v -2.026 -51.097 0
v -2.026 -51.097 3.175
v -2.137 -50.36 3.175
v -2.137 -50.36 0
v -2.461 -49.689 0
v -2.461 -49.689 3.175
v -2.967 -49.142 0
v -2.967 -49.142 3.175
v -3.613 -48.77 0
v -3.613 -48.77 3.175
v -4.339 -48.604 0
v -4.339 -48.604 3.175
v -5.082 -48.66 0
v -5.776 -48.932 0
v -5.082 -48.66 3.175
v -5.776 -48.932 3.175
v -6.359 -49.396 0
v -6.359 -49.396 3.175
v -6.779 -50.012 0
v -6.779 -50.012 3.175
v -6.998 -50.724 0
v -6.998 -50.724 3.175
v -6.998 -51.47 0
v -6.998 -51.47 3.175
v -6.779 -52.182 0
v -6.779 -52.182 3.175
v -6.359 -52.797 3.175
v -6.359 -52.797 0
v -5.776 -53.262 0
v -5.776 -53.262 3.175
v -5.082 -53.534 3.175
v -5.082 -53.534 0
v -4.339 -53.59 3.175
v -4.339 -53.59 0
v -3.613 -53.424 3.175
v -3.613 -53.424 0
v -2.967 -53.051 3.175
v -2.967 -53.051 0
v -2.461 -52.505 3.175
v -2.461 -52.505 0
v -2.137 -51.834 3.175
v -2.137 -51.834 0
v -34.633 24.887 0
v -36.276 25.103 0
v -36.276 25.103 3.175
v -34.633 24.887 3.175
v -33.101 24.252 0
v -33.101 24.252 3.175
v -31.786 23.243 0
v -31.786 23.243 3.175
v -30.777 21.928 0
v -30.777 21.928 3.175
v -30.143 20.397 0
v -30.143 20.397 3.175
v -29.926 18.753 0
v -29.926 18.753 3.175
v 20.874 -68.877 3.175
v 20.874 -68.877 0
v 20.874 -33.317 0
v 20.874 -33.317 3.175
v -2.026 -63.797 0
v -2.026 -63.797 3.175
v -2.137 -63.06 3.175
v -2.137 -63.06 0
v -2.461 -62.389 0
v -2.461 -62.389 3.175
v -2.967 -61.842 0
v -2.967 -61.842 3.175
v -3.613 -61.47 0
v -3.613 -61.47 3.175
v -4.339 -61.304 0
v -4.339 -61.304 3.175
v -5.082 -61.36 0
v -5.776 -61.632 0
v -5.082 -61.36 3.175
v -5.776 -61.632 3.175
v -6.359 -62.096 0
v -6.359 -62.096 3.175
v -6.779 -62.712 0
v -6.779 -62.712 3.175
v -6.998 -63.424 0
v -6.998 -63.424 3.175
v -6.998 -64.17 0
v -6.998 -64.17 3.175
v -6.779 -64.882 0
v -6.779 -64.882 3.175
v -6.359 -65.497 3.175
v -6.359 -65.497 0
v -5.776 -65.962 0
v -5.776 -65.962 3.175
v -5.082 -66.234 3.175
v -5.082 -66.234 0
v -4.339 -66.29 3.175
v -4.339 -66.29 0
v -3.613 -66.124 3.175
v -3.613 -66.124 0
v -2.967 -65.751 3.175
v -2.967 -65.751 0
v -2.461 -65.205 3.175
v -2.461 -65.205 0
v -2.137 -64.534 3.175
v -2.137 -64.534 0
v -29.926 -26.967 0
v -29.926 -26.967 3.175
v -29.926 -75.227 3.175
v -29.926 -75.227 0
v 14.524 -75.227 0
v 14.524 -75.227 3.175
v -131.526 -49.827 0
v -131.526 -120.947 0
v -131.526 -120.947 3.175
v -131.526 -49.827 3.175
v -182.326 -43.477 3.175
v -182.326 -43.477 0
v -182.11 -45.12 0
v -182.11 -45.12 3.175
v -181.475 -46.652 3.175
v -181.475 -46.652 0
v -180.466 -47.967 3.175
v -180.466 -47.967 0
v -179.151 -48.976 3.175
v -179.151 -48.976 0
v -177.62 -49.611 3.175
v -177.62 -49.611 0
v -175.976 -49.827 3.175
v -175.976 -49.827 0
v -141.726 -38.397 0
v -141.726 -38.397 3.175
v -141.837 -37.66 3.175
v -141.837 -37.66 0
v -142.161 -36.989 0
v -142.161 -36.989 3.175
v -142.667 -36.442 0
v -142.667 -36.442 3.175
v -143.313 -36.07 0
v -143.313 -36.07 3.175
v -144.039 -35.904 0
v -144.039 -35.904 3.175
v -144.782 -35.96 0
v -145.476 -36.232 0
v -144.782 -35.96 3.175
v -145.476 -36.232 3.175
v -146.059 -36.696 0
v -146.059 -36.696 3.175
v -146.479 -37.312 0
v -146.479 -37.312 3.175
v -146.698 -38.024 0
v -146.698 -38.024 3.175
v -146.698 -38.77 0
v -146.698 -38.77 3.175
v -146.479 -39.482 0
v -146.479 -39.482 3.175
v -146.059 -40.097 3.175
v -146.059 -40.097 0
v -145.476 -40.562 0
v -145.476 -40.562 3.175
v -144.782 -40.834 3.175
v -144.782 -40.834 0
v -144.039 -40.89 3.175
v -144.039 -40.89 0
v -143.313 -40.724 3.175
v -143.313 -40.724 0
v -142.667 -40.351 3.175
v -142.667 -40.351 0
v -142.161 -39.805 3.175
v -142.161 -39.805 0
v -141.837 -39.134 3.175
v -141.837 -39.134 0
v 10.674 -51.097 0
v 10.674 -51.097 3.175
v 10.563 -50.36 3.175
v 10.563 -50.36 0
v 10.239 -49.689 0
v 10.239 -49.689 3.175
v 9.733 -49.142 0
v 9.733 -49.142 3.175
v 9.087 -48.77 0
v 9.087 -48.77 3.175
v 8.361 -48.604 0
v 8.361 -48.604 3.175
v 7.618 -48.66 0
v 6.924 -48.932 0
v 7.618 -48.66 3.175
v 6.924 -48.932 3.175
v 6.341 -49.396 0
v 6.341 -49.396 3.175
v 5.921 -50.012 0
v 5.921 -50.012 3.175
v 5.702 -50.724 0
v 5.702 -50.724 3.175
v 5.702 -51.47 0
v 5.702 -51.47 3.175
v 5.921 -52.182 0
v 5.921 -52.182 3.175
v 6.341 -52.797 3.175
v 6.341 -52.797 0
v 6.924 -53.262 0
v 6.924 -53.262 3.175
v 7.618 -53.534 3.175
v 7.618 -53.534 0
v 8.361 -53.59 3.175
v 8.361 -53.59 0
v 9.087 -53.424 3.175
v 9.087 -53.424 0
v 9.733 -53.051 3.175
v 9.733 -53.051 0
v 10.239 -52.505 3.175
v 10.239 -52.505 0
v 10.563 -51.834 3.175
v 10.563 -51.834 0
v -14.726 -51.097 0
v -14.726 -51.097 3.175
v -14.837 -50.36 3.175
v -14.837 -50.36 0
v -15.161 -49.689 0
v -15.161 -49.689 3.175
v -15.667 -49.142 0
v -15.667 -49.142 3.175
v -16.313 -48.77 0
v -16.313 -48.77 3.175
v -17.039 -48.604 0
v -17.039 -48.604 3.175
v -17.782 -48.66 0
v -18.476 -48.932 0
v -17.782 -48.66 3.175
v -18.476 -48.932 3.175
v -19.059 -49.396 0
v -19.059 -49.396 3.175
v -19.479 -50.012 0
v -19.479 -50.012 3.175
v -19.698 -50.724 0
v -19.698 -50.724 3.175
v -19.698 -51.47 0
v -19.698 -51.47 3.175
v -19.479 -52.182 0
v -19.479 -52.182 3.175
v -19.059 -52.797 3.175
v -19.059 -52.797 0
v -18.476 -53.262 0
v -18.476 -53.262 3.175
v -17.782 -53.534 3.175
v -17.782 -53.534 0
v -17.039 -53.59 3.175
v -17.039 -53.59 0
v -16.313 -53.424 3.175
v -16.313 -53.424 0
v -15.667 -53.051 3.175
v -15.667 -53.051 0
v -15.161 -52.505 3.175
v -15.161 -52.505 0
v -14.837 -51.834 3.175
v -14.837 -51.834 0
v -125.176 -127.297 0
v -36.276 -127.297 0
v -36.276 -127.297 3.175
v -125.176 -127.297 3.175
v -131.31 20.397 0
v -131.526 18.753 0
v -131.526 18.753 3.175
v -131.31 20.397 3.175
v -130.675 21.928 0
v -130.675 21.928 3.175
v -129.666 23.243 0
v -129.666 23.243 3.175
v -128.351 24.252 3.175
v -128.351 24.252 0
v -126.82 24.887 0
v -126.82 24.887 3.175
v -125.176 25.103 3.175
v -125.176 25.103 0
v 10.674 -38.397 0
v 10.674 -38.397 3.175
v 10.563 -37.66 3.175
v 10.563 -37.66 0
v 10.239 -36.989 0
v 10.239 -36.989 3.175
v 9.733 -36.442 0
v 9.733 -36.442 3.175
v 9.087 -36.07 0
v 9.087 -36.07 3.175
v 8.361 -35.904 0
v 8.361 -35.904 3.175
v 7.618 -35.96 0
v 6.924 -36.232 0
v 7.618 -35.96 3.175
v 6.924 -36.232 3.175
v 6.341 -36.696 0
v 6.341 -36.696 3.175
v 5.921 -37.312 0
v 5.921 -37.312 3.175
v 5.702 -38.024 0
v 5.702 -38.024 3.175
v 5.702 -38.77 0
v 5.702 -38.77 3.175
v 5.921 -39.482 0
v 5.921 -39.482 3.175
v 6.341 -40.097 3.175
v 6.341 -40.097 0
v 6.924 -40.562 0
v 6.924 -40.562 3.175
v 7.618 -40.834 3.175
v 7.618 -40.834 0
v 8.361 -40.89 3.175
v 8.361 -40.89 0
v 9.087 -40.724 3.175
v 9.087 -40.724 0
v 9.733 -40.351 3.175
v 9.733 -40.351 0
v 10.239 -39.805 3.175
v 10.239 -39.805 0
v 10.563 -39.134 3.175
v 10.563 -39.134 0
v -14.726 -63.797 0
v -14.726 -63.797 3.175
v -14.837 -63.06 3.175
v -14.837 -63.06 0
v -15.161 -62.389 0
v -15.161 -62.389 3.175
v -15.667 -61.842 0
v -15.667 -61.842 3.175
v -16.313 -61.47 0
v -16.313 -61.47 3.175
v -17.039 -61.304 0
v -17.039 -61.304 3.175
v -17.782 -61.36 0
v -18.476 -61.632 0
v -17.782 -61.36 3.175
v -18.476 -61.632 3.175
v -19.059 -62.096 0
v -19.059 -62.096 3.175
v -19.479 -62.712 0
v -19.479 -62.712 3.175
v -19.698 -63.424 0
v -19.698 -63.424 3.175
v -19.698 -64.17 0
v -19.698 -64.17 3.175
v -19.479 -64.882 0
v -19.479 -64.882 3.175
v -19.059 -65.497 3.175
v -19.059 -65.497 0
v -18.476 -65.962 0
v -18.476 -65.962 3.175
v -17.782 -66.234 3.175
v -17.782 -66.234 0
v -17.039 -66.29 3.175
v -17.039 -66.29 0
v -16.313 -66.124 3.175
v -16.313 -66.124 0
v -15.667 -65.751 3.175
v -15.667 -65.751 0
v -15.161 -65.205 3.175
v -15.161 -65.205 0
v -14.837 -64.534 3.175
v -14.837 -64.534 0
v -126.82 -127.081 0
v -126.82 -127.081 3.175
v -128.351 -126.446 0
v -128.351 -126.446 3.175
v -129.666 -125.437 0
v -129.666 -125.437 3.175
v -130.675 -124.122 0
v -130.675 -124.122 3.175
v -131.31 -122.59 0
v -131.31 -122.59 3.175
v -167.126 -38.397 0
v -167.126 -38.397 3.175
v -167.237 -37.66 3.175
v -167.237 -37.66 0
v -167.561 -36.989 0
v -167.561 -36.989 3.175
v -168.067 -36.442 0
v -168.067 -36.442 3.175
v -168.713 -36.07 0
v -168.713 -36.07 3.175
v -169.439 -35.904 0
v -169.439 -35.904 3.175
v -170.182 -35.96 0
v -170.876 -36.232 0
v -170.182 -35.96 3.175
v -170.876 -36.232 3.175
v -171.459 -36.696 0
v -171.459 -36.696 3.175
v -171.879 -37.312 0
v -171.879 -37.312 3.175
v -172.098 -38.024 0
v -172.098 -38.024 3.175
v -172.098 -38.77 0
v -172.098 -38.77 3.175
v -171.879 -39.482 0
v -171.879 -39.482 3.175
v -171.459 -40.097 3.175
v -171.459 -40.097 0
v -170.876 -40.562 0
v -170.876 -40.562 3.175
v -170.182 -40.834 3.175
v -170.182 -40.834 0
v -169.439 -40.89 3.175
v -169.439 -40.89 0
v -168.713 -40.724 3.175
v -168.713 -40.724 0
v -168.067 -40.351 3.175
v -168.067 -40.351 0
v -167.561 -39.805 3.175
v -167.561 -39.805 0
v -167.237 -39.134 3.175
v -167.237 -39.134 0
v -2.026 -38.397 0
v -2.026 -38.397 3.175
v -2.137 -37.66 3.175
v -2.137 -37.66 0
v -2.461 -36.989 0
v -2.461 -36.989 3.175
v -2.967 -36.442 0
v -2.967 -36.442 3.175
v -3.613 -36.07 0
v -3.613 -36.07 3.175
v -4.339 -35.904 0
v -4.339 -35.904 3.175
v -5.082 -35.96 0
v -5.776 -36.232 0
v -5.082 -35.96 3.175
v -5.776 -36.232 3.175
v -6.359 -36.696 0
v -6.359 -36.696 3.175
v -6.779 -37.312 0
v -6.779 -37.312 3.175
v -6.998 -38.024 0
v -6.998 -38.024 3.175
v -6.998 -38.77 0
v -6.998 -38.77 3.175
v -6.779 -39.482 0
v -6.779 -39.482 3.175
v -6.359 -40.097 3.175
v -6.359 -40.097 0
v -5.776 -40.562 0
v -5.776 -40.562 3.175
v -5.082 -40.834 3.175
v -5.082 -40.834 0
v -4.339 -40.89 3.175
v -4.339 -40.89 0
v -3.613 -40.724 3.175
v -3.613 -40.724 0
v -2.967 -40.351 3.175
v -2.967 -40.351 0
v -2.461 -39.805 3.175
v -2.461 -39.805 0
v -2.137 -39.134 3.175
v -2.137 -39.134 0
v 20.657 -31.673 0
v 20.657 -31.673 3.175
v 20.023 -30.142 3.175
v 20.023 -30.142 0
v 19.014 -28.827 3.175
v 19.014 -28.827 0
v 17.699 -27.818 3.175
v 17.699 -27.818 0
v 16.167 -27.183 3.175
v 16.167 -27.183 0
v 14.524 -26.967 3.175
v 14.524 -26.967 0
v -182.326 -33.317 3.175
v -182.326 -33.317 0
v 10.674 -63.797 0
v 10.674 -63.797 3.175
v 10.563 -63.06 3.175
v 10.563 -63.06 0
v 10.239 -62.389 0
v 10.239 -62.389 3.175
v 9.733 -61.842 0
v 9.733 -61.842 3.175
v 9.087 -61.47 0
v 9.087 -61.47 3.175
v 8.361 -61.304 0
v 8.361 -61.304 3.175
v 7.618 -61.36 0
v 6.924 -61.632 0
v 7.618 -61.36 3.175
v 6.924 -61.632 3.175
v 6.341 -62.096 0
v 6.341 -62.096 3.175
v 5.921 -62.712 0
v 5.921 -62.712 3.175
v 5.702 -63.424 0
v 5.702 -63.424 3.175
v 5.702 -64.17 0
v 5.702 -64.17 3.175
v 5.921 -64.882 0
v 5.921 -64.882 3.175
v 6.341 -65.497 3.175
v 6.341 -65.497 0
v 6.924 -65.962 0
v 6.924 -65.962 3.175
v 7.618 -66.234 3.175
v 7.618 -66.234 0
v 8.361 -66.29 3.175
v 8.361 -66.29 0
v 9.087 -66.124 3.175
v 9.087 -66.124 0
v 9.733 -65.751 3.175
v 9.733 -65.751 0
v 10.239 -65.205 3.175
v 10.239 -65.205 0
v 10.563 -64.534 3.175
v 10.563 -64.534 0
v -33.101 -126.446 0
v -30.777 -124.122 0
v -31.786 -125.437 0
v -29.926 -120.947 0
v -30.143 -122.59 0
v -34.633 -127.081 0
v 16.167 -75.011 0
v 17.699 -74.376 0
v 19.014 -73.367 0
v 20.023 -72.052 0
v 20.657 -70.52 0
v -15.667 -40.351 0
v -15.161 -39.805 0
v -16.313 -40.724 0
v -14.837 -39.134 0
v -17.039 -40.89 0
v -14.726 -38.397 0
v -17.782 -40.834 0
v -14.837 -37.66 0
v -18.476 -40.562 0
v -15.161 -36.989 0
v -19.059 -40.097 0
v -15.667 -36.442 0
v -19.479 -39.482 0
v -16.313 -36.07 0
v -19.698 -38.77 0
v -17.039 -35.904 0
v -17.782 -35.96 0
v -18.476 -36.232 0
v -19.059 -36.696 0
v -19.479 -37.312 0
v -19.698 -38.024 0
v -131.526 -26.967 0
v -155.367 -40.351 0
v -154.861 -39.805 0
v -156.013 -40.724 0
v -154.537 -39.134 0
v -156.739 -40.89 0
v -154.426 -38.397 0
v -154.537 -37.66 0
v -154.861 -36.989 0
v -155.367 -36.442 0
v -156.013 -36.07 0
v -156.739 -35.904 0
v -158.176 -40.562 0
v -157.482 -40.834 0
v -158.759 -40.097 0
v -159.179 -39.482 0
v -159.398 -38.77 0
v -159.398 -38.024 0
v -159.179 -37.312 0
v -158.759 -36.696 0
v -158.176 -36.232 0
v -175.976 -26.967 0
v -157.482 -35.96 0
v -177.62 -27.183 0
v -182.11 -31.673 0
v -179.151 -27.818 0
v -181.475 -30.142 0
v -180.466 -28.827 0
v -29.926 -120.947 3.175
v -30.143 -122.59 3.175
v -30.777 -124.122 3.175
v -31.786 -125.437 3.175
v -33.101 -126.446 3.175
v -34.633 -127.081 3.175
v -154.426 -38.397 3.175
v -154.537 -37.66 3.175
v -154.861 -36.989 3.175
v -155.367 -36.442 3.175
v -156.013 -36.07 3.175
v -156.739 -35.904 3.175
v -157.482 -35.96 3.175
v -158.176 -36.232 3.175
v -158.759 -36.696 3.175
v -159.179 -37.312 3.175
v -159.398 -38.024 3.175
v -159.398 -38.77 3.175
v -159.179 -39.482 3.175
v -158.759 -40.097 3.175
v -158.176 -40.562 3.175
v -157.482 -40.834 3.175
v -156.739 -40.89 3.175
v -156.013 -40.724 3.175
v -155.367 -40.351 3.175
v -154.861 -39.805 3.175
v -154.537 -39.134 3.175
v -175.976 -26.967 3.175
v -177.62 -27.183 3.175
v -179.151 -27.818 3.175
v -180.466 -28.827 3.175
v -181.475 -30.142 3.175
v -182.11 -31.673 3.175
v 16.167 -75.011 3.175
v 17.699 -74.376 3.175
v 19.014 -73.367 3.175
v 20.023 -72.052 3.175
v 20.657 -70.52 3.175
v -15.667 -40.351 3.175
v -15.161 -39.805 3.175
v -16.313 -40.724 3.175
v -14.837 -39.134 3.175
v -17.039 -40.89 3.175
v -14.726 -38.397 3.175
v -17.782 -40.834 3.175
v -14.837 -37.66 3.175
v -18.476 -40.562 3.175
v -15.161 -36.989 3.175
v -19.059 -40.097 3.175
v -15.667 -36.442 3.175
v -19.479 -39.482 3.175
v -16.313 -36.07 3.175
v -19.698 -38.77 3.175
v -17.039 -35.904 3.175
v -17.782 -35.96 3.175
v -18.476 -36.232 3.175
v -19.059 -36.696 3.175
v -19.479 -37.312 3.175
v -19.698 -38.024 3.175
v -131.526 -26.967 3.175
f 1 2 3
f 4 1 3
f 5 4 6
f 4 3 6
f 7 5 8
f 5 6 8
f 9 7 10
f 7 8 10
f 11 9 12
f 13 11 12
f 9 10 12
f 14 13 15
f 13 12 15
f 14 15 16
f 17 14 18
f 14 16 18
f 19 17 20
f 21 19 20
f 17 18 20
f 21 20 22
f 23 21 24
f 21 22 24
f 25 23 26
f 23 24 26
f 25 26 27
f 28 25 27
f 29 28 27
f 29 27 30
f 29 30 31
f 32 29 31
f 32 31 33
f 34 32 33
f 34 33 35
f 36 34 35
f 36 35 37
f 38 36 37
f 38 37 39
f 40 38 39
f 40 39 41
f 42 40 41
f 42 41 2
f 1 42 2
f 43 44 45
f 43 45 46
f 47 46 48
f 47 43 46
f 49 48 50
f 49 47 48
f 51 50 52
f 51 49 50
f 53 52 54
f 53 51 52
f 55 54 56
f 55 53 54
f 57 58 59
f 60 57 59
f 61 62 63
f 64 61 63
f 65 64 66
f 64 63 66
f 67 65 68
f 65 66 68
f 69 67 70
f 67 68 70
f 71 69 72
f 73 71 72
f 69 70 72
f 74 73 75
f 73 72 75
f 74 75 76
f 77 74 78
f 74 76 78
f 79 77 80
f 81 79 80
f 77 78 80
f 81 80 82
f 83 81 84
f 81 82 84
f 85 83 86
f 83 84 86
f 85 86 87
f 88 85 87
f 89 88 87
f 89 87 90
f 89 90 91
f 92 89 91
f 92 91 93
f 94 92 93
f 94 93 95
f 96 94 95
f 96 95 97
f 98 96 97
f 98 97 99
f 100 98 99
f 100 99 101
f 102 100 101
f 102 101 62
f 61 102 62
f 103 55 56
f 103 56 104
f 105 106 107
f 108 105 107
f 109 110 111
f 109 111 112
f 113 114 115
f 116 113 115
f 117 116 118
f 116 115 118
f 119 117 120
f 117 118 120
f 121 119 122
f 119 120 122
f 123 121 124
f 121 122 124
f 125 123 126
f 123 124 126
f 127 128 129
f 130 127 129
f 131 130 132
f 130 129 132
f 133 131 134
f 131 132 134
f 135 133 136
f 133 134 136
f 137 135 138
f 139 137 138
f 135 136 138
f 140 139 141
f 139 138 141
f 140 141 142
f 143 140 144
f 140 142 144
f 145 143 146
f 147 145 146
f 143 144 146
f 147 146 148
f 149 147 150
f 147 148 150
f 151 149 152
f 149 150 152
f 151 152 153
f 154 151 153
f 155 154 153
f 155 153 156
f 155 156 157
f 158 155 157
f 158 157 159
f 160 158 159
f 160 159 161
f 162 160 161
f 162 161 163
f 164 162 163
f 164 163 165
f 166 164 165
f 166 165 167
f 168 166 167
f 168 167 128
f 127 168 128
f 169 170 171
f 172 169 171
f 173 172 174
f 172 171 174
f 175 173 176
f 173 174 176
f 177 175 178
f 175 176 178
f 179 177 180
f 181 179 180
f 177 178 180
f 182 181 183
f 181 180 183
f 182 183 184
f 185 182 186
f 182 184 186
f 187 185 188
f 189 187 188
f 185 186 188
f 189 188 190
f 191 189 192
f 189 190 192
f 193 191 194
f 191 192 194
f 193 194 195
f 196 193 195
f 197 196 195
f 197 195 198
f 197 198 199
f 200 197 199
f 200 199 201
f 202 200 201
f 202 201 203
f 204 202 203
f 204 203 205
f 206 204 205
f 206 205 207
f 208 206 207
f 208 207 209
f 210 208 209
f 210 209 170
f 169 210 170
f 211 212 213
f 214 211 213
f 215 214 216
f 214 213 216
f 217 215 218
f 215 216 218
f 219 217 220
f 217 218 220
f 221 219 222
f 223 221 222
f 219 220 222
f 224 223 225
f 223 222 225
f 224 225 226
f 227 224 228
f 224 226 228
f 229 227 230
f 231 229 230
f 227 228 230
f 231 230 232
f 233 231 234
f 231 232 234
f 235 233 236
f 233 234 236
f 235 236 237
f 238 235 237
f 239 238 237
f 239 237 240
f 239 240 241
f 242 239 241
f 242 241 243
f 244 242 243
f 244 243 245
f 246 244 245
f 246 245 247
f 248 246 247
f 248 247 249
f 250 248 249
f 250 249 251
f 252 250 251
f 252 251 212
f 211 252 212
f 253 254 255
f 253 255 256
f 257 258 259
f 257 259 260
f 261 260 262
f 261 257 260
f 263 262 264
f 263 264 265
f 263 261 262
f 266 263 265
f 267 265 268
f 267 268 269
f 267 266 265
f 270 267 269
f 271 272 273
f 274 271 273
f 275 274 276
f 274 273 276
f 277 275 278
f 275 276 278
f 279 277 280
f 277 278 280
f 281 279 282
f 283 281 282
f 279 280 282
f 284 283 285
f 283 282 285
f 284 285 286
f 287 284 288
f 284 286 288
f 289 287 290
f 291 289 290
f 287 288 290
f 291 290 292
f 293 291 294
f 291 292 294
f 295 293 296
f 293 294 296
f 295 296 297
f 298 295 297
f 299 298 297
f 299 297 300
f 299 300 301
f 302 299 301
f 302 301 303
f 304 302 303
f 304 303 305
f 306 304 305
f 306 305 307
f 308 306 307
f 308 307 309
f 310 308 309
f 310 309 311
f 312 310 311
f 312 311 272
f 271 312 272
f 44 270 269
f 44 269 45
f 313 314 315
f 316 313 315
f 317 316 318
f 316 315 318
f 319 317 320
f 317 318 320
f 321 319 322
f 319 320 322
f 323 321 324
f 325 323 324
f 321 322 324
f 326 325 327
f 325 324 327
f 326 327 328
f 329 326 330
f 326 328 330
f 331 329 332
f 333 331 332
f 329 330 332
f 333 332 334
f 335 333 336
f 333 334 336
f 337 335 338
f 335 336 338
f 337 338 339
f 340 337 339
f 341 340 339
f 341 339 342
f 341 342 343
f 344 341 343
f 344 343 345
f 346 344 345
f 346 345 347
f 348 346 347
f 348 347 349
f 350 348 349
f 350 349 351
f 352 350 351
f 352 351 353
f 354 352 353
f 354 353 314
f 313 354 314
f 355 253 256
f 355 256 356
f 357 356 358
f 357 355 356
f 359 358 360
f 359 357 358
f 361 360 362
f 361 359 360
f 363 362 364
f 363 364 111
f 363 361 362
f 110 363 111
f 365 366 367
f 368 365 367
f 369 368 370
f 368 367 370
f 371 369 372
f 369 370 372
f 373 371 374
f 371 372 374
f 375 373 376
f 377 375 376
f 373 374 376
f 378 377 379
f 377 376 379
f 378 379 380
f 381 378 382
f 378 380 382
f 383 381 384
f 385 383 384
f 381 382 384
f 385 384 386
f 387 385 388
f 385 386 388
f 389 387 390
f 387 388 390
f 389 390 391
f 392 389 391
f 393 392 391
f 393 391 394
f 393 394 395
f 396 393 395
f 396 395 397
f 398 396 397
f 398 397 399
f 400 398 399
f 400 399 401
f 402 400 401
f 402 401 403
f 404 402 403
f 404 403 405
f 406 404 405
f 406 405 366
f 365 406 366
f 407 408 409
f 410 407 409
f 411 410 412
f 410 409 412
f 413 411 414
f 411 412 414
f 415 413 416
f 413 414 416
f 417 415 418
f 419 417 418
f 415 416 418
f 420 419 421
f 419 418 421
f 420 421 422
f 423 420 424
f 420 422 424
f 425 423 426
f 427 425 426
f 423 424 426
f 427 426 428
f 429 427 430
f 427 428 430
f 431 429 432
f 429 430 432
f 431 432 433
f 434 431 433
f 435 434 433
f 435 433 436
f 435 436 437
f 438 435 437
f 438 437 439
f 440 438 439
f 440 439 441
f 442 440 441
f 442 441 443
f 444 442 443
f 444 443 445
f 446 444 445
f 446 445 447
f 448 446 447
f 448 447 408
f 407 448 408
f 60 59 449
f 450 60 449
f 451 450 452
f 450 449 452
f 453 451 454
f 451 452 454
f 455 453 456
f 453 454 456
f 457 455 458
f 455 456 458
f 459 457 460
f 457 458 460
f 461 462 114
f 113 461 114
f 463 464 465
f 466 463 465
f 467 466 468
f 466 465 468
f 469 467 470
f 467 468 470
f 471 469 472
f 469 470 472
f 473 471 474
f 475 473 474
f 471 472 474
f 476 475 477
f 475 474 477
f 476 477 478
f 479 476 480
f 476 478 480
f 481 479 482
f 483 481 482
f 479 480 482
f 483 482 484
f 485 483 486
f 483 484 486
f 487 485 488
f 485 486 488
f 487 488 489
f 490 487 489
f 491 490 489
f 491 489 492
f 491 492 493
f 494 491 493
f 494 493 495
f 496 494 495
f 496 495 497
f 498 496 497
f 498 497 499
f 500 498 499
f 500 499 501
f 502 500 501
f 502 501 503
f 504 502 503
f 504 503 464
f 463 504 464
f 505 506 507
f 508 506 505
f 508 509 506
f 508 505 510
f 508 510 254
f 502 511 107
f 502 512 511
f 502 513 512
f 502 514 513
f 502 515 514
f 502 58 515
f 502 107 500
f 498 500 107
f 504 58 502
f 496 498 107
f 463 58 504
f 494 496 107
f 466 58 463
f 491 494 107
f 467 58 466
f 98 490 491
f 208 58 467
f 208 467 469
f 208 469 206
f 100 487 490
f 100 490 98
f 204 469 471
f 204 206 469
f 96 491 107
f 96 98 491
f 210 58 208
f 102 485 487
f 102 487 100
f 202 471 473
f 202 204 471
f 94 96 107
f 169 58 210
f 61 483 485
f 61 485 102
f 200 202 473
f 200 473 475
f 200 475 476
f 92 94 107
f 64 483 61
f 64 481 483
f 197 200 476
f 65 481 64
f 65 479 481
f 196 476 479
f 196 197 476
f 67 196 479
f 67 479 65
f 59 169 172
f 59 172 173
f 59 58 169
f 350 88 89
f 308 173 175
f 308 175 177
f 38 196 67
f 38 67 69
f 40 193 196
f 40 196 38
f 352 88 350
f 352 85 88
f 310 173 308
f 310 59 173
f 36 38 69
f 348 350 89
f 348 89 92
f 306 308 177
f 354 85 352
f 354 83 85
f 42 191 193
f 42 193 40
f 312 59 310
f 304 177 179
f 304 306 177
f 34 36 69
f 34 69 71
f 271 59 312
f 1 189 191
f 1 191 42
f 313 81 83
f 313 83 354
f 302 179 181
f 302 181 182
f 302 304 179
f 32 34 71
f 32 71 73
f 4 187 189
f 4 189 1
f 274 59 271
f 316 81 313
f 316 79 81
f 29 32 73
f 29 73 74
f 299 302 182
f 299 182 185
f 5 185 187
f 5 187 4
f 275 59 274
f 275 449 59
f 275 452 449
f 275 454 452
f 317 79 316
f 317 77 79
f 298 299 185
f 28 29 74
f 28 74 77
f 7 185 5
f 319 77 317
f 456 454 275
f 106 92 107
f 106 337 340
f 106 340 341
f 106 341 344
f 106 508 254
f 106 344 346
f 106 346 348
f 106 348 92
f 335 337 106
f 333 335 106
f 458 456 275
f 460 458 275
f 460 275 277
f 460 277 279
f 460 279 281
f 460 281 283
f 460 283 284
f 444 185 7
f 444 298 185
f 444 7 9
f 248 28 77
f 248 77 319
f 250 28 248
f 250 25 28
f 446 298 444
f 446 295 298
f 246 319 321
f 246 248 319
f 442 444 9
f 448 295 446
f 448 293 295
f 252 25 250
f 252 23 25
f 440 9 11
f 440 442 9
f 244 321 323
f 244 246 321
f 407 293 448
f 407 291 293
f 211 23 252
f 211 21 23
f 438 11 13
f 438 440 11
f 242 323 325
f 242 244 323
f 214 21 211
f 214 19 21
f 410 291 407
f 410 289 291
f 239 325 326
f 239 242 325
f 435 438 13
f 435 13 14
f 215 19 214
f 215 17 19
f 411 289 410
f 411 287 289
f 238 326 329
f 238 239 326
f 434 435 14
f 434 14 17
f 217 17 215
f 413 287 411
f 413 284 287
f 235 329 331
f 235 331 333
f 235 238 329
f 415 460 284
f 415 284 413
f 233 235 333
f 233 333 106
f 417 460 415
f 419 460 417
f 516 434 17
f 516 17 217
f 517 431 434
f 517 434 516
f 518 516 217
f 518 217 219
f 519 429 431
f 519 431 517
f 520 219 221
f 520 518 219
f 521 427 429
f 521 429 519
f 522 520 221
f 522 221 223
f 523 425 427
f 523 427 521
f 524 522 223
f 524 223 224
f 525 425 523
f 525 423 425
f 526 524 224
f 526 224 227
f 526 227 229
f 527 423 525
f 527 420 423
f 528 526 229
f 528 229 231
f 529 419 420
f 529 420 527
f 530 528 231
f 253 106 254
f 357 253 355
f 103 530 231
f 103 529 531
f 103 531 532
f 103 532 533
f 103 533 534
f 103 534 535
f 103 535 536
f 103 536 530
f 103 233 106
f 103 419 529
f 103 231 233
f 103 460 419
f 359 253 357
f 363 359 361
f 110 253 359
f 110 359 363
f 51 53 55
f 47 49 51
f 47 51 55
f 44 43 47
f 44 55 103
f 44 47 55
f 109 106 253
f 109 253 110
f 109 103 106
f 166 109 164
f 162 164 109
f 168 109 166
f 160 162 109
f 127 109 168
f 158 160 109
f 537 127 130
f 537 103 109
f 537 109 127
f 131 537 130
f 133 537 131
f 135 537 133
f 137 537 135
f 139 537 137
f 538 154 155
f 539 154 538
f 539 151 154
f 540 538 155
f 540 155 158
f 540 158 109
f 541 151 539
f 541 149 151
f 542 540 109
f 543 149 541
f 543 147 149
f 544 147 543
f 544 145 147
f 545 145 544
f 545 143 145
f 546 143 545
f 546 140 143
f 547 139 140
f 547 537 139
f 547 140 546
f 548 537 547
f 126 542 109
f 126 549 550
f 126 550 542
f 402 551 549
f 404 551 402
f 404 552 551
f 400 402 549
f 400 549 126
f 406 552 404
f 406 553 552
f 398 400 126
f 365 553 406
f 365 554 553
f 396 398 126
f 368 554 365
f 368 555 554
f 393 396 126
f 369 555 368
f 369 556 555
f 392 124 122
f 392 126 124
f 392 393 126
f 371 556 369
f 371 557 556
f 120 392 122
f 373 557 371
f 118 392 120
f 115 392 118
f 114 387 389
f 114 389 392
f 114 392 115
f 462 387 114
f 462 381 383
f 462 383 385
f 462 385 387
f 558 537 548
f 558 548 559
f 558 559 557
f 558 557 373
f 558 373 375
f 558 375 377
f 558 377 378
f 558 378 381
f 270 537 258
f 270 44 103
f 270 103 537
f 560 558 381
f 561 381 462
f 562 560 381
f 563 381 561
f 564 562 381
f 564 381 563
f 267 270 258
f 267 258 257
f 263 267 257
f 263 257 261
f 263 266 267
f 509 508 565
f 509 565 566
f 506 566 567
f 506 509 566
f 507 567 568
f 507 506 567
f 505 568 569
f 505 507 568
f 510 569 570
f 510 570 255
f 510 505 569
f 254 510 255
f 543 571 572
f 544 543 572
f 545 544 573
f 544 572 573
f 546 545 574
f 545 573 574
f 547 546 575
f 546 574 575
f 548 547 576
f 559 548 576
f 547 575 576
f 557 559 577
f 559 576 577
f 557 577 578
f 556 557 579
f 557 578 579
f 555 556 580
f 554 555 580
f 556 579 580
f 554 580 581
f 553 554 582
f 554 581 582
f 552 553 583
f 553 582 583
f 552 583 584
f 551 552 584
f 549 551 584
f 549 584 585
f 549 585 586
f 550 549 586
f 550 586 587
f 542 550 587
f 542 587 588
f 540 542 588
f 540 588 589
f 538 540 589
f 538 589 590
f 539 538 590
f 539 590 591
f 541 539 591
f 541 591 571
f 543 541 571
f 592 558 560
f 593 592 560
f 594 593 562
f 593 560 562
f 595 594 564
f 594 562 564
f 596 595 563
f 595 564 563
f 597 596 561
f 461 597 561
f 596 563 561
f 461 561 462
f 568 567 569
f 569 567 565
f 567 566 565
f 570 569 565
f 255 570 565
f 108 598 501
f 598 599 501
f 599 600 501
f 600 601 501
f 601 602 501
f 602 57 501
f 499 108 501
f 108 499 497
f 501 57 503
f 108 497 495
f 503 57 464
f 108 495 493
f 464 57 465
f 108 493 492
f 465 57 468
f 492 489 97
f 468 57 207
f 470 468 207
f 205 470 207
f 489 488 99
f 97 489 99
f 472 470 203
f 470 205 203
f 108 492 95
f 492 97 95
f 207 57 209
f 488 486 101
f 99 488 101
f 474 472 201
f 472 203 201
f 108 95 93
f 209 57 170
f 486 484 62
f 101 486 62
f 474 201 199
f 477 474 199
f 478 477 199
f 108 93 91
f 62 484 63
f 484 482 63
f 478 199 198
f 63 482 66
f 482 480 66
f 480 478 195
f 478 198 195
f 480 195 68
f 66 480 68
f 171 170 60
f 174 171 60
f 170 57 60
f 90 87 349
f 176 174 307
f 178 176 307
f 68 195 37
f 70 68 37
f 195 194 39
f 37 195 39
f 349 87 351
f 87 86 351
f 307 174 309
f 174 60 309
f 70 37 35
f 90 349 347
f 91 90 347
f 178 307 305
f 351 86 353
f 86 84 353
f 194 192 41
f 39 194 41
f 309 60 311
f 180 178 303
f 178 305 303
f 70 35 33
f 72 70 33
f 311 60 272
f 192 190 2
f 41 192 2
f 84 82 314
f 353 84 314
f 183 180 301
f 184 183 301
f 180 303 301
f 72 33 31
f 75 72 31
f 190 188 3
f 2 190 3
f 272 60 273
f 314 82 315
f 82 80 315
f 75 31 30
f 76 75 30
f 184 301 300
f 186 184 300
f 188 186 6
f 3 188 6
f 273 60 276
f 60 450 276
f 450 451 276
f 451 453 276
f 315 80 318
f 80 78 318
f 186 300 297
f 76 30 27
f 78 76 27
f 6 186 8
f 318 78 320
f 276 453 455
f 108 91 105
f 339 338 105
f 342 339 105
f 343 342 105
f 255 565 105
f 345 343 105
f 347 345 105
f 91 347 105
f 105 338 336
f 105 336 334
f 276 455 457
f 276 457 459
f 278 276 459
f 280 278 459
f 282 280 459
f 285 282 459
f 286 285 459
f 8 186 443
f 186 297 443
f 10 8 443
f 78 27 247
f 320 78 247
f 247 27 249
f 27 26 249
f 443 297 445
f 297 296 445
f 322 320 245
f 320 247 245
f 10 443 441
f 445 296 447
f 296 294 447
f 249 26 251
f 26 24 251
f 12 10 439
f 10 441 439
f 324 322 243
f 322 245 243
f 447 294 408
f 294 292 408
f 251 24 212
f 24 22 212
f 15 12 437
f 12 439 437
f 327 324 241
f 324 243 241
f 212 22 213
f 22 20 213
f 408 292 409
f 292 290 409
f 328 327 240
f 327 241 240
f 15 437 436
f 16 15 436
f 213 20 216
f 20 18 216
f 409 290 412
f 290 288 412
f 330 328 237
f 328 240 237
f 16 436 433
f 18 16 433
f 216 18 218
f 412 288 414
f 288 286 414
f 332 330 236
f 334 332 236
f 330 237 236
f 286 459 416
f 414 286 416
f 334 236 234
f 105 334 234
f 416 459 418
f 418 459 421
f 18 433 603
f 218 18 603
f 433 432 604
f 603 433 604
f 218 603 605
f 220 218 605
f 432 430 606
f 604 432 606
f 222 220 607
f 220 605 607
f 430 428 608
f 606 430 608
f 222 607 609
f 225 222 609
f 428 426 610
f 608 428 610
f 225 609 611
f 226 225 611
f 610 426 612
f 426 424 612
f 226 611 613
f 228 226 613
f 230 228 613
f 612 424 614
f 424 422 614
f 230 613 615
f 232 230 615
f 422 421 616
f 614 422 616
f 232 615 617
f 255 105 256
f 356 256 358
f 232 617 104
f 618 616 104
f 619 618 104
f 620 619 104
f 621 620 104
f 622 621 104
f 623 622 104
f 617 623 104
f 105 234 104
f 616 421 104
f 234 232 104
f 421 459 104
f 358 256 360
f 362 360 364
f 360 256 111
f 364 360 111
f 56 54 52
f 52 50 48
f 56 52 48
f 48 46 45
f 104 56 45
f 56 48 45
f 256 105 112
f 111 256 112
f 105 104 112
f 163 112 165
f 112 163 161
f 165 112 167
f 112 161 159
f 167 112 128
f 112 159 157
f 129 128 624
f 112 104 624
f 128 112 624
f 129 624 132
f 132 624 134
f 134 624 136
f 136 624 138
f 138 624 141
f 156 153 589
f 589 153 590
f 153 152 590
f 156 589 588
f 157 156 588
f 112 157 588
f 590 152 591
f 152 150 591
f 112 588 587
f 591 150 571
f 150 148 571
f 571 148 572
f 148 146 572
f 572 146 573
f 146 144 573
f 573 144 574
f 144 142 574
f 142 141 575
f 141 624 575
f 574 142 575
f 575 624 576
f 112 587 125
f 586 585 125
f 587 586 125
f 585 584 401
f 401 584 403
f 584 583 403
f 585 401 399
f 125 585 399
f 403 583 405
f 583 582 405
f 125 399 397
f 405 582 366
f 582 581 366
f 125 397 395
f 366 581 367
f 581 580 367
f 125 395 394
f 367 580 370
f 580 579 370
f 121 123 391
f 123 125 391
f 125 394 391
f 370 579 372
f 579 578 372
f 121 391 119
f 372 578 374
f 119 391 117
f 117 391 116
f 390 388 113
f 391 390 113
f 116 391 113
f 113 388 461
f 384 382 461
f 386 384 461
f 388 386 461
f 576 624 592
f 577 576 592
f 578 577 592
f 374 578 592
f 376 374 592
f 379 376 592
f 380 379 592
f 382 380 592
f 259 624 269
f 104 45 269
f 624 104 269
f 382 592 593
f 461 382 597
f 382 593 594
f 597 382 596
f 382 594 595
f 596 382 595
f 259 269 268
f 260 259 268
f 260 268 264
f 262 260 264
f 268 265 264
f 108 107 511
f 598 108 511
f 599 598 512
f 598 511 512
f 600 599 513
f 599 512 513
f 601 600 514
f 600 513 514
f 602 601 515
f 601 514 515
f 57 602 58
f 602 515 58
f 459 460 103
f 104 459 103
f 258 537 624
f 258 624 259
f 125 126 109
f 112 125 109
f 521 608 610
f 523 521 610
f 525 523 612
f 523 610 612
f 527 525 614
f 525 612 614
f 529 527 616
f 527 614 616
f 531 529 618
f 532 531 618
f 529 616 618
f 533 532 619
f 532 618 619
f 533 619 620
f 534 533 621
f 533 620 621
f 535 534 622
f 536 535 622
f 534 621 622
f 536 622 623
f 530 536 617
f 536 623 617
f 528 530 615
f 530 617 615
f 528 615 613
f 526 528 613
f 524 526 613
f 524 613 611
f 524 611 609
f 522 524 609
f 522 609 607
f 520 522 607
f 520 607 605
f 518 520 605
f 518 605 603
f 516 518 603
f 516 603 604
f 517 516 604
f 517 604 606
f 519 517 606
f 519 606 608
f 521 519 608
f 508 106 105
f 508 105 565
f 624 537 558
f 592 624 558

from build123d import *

# Parameters (mm, degrees)
BOSS_EXTRUDE1_DEPTH = 3.175
SKETCH2_R           = 2.5
CUT_EXTRUDE1_DEPTH  = 4.175


with BuildPart() as part:
    # Sketch1 → Boss-Extrude1 (new body)
    with BuildSketch(Plane.XY):
        with BuildLine():
            Line((-125.176151208, 25.103095989), (-36.276151208, 25.103095989))
            ThreePointArc((-36.276151208, 25.103095989), (-31.786023147, 23.24322405), (-29.926151208, 18.753095989))
            Line((-29.926151208, 18.753095989), (-29.926151208, -120.946904011))
            ThreePointArc((-29.926151208, -120.946904011), (-31.786023147, -125.437032071), (-36.276151208, -127.296904011))
            Line((-36.276151208, -127.296904011), (-125.176151208, -127.296904011))
            ThreePointArc((-125.176151208, -127.296904011), (-129.666279268, -125.437032071), (-131.526151208, -120.946904011))
            Line((-131.526151208, -120.946904011), (-131.526151208, 18.753095989))
            ThreePointArc((-131.526151208, 18.753095989), (-129.666279268, 23.24322405), (-125.176151208, 25.103095989))
        make_face()
        with BuildLine():
            Line((-131.526151208, -49.826904011), (-131.526151208, -26.966904011))
            Line((-131.526151208, -26.966904011), (-175.976151208, -26.966904011))
            ThreePointArc((-175.976151208, -26.966904011), (-180.466279268, -28.82677595), (-182.326151208, -33.316904011))
            Line((-182.326151208, -33.316904011), (-182.326151208, -43.476904011))
            ThreePointArc((-182.326151208, -43.476904011), (-180.466279268, -47.967032071), (-175.976151208, -49.826904011))
            Line((-175.976151208, -49.826904011), (-131.526151208, -49.826904011))
        make_face()
        with BuildLine():
            Line((14.523848792, -26.966904011), (-29.926151208, -26.966904011))
            Line((-29.926151208, -26.966904011), (-29.926151208, -75.226904011))
            Line((-29.926151208, -75.226904011), (14.523848792, -75.226904011))
            ThreePointArc((14.523848792, -75.226904011), (19.013976853, -73.367032071), (20.873848792, -68.876904011))
            Line((20.873848792, -68.876904011), (20.873848792, -33.316904011))
            ThreePointArc((20.873848792, -33.316904011), (19.013976853, -28.82677595), (14.523848792, -26.966904011))
        make_face()
    extrude(amount=BOSS_EXTRUDE1_DEPTH)

    # Sketch2 → Cut-Extrude1 (cut, through all)
    with BuildSketch(Plane.XY.offset(3.175)):
        with Locations((-169.626151208, -38.396904011)):
            Circle(SKETCH2_R)
        with Locations((8.173848792, -63.796904011)):
            Circle(SKETCH2_R)
        with Locations((-156.926151208, -38.396904011)):
            Circle(SKETCH2_R)
        with Locations((-144.226151208, -38.396904011)):
            Circle(SKETCH2_R)
        with Locations((-4.526151208, -63.796904011)):
            Circle(SKETCH2_R)
        with Locations((-17.226151208, -63.796904011)):
            Circle(SKETCH2_R)
        with Locations((-4.526151208, -51.096904011)):
            Circle(SKETCH2_R)
        with Locations((-17.226151208, -51.096904011)):
            Circle(SKETCH2_R)
        with Locations((-4.526151208, -38.396904011)):
            Circle(SKETCH2_R)
        with Locations((-17.226151208, -38.396904011)):
            Circle(SKETCH2_R)
        with Locations((8.173848792, -51.096904011)):
            Circle(SKETCH2_R)
        with Locations((8.173848792, -38.396904011)):
            Circle(SKETCH2_R)
    extrude(amount=-CUT_EXTRUDE1_DEPTH, mode=Mode.SUBTRACT)


solid = part.part
